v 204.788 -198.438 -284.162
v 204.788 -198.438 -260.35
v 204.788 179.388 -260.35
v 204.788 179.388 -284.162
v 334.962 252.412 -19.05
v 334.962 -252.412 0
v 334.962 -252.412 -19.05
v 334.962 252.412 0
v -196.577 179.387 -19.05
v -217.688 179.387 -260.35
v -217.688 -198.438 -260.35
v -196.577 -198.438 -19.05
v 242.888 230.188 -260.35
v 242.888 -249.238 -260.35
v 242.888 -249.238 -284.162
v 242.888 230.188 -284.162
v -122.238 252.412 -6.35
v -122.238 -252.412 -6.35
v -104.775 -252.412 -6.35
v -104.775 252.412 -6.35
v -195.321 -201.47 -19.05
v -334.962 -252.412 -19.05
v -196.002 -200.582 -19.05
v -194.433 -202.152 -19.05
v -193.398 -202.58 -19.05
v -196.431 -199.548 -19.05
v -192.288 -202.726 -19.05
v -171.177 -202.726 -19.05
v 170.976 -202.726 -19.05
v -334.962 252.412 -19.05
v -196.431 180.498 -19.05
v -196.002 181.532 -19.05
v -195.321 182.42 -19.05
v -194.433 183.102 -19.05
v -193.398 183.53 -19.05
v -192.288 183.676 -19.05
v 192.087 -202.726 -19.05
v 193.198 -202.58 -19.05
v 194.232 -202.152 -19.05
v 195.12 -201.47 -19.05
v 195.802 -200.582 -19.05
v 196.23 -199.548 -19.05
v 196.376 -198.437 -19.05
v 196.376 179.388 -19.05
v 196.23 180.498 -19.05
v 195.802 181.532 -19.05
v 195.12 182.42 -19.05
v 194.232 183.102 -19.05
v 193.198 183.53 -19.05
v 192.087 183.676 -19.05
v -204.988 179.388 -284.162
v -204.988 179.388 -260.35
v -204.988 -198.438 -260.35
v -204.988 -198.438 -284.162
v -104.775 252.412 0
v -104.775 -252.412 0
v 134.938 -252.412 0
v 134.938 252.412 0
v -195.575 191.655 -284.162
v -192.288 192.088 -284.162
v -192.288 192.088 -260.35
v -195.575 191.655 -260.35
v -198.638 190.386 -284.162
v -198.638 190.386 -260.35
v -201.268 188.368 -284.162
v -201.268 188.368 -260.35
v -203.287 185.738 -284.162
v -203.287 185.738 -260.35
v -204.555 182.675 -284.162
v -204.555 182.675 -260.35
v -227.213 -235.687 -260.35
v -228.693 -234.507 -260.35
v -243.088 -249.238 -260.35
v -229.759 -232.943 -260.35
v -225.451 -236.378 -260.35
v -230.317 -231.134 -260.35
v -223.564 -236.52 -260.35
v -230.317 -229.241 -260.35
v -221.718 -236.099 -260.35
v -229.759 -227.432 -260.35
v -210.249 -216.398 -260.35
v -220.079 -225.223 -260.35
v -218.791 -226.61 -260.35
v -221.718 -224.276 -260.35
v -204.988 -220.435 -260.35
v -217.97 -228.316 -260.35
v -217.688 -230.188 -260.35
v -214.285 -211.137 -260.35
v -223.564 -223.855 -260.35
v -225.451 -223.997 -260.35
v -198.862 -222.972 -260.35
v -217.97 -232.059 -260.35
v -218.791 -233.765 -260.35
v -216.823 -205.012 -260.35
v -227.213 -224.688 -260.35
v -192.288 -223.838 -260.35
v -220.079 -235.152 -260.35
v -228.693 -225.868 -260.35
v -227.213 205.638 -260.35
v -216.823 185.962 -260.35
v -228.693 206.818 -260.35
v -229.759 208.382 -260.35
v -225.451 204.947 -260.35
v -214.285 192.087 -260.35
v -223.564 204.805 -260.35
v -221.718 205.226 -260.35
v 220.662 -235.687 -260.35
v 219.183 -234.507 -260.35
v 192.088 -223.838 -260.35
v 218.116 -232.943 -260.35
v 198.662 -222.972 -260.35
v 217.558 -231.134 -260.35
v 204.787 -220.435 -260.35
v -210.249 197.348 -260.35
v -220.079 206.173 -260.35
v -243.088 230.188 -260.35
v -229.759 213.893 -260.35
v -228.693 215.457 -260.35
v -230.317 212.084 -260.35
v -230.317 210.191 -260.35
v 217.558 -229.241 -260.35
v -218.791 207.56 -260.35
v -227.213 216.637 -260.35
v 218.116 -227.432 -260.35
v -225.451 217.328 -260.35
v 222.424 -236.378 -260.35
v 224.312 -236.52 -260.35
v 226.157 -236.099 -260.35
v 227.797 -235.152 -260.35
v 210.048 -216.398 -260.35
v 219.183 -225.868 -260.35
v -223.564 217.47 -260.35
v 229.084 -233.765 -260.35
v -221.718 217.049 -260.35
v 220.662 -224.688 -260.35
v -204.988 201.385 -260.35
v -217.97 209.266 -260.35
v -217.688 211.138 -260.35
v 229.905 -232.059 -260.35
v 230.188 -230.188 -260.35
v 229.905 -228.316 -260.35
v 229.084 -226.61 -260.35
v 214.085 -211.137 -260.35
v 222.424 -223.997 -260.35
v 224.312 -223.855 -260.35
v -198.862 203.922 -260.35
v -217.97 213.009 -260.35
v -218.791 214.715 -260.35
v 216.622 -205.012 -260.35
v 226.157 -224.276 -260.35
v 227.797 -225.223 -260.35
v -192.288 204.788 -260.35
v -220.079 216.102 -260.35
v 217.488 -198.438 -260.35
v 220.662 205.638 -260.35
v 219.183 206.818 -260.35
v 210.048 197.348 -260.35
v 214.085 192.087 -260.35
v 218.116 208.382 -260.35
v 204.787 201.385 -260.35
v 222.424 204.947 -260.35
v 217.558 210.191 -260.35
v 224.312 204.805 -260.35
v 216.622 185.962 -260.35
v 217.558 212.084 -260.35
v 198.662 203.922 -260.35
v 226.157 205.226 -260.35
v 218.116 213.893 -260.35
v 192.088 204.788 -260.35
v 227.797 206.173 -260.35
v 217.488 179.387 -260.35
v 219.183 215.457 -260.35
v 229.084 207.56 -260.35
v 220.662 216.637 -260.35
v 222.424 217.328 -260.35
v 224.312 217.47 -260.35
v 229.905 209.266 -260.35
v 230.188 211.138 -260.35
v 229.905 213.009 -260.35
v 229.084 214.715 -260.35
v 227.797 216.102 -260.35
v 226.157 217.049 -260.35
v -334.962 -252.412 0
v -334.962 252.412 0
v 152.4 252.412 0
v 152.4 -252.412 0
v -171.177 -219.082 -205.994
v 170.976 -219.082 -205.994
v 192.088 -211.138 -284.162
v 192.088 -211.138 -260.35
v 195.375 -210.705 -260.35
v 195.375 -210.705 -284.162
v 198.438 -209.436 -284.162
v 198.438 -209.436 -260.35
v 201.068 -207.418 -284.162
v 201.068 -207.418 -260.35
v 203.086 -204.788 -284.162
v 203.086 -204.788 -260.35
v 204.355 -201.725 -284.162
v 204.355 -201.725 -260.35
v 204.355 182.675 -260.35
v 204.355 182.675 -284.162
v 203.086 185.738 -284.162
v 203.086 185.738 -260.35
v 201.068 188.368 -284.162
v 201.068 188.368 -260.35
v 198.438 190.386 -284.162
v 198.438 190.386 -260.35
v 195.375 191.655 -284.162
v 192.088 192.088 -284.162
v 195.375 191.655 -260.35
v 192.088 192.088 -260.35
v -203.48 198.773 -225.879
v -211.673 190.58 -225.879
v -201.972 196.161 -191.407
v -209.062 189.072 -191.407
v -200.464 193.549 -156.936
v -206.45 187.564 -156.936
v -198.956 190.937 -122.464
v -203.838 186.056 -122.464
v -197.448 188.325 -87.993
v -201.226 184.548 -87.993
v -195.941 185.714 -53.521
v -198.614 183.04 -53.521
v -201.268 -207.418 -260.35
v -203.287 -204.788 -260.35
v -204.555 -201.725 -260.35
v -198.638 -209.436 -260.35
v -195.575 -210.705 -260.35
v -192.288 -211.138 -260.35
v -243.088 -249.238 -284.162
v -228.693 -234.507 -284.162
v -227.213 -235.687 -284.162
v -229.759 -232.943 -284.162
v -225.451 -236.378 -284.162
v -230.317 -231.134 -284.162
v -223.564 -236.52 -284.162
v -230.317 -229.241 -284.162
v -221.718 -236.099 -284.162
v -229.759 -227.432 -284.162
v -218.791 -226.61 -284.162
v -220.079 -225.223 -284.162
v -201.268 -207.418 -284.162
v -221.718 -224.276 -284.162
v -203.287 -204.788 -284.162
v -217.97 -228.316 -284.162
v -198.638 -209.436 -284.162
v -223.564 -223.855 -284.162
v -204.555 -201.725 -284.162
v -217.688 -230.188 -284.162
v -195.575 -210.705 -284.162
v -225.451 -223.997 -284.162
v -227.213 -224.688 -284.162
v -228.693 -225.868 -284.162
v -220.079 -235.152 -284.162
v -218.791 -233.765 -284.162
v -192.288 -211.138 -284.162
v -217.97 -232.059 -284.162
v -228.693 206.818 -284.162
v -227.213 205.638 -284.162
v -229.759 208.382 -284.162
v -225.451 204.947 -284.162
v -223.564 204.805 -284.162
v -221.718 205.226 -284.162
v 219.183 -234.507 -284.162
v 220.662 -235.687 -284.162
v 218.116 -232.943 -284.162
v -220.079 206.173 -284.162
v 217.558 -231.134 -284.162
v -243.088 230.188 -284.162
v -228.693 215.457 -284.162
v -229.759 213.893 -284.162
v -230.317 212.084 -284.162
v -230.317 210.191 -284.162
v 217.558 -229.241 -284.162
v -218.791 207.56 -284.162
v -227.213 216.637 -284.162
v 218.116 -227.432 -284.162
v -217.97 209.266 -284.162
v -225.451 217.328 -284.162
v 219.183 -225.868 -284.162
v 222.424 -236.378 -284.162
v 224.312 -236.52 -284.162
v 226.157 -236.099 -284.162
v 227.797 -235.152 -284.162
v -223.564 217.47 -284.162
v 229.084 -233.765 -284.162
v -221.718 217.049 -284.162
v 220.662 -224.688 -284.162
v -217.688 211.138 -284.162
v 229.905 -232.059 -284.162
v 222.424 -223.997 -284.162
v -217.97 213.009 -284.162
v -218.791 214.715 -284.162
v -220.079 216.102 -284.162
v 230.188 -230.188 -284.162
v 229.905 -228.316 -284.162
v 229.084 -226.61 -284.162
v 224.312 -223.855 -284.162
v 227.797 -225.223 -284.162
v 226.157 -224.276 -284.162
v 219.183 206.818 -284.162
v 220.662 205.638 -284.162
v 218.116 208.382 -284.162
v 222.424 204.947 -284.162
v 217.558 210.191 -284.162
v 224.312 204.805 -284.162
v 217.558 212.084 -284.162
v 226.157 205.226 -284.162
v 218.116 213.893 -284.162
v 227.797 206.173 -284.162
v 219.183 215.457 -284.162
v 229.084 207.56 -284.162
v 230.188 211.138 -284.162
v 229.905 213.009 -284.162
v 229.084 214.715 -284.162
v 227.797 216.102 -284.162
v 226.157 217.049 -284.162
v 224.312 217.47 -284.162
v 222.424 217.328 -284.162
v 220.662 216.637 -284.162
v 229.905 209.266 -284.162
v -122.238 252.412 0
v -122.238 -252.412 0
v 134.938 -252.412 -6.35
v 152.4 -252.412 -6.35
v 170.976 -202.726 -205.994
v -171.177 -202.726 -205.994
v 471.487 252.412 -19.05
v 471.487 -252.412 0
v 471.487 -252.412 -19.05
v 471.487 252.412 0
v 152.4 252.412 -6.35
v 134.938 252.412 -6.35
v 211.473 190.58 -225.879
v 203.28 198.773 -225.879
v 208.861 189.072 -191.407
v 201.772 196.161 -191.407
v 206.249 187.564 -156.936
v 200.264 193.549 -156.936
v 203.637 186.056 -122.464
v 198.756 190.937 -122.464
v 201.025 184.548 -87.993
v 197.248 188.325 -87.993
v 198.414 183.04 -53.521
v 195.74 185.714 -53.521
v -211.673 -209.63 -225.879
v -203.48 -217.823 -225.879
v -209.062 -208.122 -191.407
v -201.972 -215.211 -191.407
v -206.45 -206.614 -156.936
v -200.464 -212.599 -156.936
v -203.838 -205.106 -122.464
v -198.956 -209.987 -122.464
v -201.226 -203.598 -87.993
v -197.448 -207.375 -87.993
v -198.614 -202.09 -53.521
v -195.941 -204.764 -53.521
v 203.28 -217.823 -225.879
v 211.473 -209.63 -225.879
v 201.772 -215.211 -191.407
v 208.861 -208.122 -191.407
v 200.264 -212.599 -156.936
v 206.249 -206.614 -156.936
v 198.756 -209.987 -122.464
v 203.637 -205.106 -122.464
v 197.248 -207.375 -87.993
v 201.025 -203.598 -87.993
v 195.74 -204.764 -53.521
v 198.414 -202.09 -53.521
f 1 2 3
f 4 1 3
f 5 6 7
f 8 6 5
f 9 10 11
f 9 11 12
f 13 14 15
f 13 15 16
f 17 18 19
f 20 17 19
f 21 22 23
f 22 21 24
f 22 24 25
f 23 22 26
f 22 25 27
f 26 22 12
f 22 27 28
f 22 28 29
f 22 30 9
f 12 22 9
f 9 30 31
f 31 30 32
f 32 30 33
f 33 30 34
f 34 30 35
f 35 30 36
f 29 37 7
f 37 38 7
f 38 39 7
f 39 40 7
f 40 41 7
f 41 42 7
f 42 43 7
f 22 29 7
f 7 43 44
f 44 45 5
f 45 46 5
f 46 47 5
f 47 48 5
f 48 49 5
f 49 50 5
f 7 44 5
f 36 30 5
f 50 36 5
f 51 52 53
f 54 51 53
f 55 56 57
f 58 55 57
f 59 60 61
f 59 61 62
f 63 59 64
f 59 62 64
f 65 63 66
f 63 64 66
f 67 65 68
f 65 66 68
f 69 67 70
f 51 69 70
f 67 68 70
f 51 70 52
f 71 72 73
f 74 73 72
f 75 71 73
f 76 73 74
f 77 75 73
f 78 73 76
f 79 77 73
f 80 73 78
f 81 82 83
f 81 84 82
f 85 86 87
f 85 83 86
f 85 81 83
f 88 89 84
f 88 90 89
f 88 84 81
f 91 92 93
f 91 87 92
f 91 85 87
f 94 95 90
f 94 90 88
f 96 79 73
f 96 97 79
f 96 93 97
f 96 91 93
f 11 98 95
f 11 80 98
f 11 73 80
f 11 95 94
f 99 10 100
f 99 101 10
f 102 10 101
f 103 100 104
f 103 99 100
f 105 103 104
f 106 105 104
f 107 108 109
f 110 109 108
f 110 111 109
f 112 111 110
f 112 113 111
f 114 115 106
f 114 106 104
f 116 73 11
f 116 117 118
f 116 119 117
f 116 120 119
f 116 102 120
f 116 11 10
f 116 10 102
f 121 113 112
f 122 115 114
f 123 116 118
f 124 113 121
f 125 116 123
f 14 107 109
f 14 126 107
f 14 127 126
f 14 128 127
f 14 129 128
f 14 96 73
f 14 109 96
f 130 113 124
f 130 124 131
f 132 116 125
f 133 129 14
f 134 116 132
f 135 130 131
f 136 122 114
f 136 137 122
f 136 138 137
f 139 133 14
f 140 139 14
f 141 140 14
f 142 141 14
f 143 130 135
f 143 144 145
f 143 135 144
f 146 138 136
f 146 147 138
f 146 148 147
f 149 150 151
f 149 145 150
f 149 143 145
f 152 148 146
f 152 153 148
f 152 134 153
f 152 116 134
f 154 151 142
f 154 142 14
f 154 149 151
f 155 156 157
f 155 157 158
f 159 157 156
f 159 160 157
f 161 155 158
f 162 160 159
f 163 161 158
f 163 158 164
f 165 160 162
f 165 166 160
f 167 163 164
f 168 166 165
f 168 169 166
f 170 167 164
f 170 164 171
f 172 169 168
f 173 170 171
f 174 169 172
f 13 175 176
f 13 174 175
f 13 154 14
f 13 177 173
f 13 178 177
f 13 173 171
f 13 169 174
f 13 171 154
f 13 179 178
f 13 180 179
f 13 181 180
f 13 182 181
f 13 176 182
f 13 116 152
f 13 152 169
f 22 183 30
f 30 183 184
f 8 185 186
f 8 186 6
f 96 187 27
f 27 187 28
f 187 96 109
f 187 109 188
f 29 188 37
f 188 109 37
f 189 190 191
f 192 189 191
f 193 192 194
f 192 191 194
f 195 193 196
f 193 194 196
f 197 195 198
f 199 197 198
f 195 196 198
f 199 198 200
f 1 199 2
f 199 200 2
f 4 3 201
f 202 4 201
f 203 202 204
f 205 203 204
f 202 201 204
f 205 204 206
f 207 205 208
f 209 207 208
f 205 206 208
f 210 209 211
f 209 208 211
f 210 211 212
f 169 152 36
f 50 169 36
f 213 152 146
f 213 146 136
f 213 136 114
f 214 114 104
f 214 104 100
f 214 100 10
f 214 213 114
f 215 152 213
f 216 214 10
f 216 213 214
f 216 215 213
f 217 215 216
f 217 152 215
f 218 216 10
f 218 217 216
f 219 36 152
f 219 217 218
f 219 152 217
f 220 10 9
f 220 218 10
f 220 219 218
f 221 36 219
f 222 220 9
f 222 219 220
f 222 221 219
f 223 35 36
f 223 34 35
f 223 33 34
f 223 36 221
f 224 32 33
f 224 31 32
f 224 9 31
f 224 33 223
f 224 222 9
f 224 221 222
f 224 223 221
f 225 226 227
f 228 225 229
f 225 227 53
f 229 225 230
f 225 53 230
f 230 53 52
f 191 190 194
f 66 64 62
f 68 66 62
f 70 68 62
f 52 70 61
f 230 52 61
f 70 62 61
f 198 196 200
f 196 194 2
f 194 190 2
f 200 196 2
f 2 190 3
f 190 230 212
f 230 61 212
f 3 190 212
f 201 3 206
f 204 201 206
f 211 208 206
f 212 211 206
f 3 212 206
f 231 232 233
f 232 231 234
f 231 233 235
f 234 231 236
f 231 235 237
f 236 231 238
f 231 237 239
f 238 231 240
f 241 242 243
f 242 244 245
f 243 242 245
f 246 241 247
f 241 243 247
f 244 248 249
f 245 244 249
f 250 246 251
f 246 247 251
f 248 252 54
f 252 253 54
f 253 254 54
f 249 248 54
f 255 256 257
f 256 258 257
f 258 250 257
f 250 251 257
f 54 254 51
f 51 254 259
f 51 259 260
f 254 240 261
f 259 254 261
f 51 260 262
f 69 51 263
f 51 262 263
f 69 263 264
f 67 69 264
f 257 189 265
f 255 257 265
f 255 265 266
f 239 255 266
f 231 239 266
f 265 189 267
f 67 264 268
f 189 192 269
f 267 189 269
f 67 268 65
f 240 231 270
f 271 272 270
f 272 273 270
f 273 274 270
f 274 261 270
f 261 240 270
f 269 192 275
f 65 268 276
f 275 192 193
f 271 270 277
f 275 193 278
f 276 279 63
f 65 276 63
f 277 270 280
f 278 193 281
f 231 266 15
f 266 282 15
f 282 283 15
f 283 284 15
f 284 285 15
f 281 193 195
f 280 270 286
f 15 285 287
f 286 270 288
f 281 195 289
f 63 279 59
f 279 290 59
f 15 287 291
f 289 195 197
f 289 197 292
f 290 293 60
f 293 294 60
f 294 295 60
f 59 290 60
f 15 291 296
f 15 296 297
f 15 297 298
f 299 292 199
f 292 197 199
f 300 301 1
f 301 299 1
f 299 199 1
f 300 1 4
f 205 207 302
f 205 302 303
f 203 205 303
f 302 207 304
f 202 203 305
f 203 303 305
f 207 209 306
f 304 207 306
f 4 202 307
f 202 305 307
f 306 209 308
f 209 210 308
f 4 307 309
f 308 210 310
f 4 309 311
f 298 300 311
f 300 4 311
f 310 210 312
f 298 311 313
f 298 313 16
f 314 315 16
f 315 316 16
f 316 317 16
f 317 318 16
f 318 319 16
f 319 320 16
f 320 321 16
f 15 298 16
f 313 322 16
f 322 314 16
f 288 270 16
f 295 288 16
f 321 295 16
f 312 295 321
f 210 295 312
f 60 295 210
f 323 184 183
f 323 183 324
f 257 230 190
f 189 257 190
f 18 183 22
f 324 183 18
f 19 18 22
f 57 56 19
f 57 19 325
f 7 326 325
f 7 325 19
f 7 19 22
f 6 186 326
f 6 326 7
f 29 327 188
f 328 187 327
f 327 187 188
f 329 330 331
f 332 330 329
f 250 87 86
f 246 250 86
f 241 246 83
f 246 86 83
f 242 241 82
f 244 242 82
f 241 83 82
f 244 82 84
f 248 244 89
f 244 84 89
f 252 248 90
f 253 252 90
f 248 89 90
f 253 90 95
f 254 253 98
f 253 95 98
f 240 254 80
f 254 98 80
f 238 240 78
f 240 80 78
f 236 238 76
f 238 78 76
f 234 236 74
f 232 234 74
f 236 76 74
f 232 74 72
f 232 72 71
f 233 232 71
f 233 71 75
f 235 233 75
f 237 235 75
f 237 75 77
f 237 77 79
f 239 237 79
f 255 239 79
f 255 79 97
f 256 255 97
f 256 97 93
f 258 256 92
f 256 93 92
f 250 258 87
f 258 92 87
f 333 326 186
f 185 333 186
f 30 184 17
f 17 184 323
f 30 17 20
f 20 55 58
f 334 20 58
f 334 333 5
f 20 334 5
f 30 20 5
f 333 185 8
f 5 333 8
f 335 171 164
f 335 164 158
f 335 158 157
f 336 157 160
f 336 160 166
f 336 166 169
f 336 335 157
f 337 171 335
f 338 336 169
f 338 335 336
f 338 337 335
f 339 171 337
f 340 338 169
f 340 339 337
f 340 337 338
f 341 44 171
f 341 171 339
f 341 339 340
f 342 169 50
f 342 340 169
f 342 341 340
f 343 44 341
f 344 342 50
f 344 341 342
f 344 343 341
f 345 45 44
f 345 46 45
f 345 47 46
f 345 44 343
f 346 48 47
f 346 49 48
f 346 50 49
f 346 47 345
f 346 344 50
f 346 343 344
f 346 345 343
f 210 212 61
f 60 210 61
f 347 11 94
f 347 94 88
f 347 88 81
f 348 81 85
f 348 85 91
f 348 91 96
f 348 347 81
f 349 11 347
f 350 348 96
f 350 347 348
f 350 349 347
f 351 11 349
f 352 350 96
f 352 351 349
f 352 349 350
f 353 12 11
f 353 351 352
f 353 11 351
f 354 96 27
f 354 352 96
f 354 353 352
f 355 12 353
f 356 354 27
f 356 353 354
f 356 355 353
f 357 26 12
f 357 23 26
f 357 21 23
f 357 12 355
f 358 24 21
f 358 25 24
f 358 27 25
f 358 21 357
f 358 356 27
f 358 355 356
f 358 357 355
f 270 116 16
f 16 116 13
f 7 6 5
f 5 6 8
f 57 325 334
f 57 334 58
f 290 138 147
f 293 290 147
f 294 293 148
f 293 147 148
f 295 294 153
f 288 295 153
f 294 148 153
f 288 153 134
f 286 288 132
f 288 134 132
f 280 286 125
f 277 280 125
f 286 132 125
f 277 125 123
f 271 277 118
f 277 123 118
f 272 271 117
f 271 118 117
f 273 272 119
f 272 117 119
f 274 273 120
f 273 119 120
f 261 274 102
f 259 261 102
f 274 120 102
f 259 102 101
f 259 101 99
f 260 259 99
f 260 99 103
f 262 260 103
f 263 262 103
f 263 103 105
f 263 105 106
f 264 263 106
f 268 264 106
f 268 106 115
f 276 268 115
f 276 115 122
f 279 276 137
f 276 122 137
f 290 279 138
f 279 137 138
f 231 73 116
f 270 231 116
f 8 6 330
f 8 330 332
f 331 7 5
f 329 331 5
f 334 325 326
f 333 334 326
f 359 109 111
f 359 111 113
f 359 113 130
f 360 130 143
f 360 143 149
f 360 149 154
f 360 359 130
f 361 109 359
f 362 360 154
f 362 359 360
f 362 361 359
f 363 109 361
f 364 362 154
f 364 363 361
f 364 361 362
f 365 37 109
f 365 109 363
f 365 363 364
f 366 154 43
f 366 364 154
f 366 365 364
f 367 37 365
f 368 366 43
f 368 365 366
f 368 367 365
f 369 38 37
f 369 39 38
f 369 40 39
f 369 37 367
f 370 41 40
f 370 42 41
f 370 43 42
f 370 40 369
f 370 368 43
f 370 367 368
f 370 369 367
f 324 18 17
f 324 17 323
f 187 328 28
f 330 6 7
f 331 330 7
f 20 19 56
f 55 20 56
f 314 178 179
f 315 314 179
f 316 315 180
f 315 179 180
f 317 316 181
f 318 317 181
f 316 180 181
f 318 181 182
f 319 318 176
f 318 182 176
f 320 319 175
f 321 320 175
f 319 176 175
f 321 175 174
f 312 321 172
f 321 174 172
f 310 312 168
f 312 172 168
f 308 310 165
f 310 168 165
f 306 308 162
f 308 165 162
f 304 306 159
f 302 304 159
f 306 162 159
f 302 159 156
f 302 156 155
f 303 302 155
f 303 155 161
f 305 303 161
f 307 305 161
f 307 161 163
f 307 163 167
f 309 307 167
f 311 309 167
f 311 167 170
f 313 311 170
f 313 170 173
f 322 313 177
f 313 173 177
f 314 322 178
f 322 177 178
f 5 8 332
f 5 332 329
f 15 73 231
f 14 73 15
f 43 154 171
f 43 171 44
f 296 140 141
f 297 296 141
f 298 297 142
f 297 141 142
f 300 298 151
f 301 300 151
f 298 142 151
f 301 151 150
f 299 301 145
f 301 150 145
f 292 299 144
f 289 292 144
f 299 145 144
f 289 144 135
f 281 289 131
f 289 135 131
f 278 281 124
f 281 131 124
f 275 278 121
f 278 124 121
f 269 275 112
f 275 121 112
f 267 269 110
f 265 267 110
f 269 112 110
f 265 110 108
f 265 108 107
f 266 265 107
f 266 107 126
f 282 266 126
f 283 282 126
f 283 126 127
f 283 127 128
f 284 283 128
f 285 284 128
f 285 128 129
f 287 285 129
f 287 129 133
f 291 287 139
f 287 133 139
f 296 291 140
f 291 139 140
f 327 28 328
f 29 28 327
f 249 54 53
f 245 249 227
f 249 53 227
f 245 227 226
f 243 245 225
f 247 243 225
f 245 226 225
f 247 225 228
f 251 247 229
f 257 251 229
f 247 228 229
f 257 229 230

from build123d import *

# Parameters (mm, degrees)
F0_W      = 669.925
F0_H      = 504.825
F1_DEPTH  = 19.05
F2_DEPTH  = 136.525
F5_DEPTH  = 241.3
F5_TAPER  = 5
F7_DEPTH  = 23.8125
F4_W      = 485.9756112814
F4_H      = 479.425
F4_R      = 6.35
F8_DEPTH  = 23.8125
F9_W      = 342.1535822638
F9_H      = 49.6860145088
F10_DEPTH = 186.944
F11_W     = 17.4625
F11_H     = 6.35
F12_DEPTH = 504.825


with BuildPart() as f1:
    # F0 (on Top) → F1 (new body)
    with BuildSketch(Plane.XY):
        Rectangle(F0_W, F0_H)
    extrude(amount=-F1_DEPTH)


with BuildPart() as f2:
    # F2 (new): a face of the model
    f2_faces = [f1.part.faces().sort_by_distance(p)[0] for p in [
        (334.9625, 0, -9.525),
    ]]
    extrude(f2_faces, amount=F2_DEPTH)


with BuildPart() as f1_1:
    add(f1.part)

    # F4 (on offset) → F5 (join, through all)
    with BuildSketch(Plane.XY.offset(-260.35)):
        with BuildLine():
            ThreePointArc((-217.6881112814, -198.4375), (-210.2486235235, -216.3980122421), (-192.2881112814, -223.8375))
            Line((-192.2881112814, -223.8375), (192.0875, -223.8375))
            ThreePointArc((192.0875, -223.8375), (210.0480122421, -216.3980122421), (217.4875, -198.4375))
            Line((217.4875, -198.4375), (217.4875, 179.3875))
            ThreePointArc((217.4875, 179.3875), (210.0480122421, 197.3480122421), (192.0875, 204.7875))
            Line((192.0875, 204.7875), (-192.2881112814, 204.7875))
            ThreePointArc((-192.2881112814, 204.7875), (-210.2486235235, 197.3480122421), (-217.6881112814, 179.3875))
            Line((-217.6881112814, 179.3875), (-217.6881112814, -198.4375))
        make_face()
    extrude(amount=F5_DEPTH, taper=F5_TAPER)

    # F6 (on face) → F7 (join)
    with BuildSketch(Plane(origin=(0, 0, -260.35), x_dir=(1, 0, 0), z_dir=(0, 0, -1))):
        with BuildLine():
            Line((192.0875, 223.8375), (-192.2881112814, 223.8375))
            ThreePointArc((-192.2881112814, 223.8375), (-210.2486235235, 216.3980122421), (-217.6881112814, 198.4375))
            Line((-217.6881112814, 198.4375), (-217.6881112814, -179.3875))
            ThreePointArc((-217.6881112814, -179.3875), (-210.2486235235, -197.3480122421), (-192.2881112814, -204.7875))
            Line((-192.2881112814, -204.7875), (192.0875, -204.7875))
            ThreePointArc((192.0875, -204.7875), (210.0480122421, -197.3480122421), (217.4875, -179.3875))
            Line((217.4875, -179.3875), (217.4875, 198.4375))
            ThreePointArc((217.4875, 198.4375), (210.0480122421, 216.3980122421), (192.0875, 223.8375))
        make_face()
        with BuildLine():
            ThreePointArc((-192.2881112814, -192.0875), (-201.2683674025, -188.3677561211), (-204.9881112814, -179.3875))
            Line((-204.9881112814, -179.3875), (-204.9881112814, 198.4375))
            ThreePointArc((-204.9881112814, 198.4375), (-201.2683674025, 207.4177561211), (-192.2881112814, 211.1375))
            Line((-192.2881112814, 211.1375), (192.0875, 211.1375))
            ThreePointArc((192.0875, 211.1375), (201.0677561211, 207.4177561211), (204.7875, 198.4375))
            Line((204.7875, 198.4375), (204.7875, -179.3875))
            ThreePointArc((204.7875, -179.3875), (201.0677561211, -188.3677561211), (192.0875, -192.0875))
            Line((192.0875, -192.0875), (-192.2881112814, -192.0875))
        make_face(mode=Mode.SUBTRACT)
    extrude(amount=F7_DEPTH)

    # F4 (on offset) → F8 (join)
    with BuildSketch(Plane.XY.offset(-260.35)):
        with Locations((-0.1003056407, -9.525)):
            Rectangle(F4_W, F4_H)
        with Locations((-224.0381112814, -230.1875)):
            Circle(F4_R, mode=Mode.SUBTRACT)
        with BuildLine():
            Line((192.0875, -223.8375), (-192.2881112814, -223.8375))
            ThreePointArc((-192.2881112814, -223.8375), (-210.2486235235, -216.3980122421), (-217.6881112814, -198.4375))
            Line((-217.6881112814, -198.4375), (-217.6881112814, 179.3875))
            ThreePointArc((-217.6881112814, 179.3875), (-210.2486235235, 197.3480122421), (-192.2881112814, 204.7875))
            Line((-192.2881112814, 204.7875), (192.0875, 204.7875))
            ThreePointArc((192.0875, 204.7875), (210.0480122421, 197.3480122421), (217.4875, 179.3875))
            Line((217.4875, 179.3875), (217.4875, -198.4375))
            ThreePointArc((217.4875, -198.4375), (210.0480122421, -216.3980122421), (192.0875, -223.8375))
        make_face(mode=Mode.SUBTRACT)
        with Locations((223.8375, -230.1875)):
            Circle(F4_R, mode=Mode.SUBTRACT)
        with Locations((-224.0381112814, 211.1375)):
            Circle(F4_R, mode=Mode.SUBTRACT)
        with Locations((223.8375, 211.1375)):
            Circle(F4_R, mode=Mode.SUBTRACT)
    extrude(amount=-F8_DEPTH)

    # F9 (on face) → F10 (cut)
    with BuildSketch(Plane(origin=(0, 0, -19.05), x_dir=(1, 0, 0), z_dir=(0, 0, -1))):
        with Locations((-0.1003056407, 227.5694927456)):
            Rectangle(F9_W, F9_H)
    extrude(amount=F10_DEPTH, mode=Mode.SUBTRACT)

    # F11 (on face) → F12 (cut, through all)
    with BuildSketch(Plane.XZ.offset(252.4125)):
        with Locations((-113.50625, -3.175)):
            Rectangle(F11_W, F11_H)
        with Locations((143.66875, -3.175)):
            Rectangle(F11_W, F11_H)
    extrude(amount=-F12_DEPTH, mode=Mode.SUBTRACT)


solid = Compound([f2.part, f1_1.part])
